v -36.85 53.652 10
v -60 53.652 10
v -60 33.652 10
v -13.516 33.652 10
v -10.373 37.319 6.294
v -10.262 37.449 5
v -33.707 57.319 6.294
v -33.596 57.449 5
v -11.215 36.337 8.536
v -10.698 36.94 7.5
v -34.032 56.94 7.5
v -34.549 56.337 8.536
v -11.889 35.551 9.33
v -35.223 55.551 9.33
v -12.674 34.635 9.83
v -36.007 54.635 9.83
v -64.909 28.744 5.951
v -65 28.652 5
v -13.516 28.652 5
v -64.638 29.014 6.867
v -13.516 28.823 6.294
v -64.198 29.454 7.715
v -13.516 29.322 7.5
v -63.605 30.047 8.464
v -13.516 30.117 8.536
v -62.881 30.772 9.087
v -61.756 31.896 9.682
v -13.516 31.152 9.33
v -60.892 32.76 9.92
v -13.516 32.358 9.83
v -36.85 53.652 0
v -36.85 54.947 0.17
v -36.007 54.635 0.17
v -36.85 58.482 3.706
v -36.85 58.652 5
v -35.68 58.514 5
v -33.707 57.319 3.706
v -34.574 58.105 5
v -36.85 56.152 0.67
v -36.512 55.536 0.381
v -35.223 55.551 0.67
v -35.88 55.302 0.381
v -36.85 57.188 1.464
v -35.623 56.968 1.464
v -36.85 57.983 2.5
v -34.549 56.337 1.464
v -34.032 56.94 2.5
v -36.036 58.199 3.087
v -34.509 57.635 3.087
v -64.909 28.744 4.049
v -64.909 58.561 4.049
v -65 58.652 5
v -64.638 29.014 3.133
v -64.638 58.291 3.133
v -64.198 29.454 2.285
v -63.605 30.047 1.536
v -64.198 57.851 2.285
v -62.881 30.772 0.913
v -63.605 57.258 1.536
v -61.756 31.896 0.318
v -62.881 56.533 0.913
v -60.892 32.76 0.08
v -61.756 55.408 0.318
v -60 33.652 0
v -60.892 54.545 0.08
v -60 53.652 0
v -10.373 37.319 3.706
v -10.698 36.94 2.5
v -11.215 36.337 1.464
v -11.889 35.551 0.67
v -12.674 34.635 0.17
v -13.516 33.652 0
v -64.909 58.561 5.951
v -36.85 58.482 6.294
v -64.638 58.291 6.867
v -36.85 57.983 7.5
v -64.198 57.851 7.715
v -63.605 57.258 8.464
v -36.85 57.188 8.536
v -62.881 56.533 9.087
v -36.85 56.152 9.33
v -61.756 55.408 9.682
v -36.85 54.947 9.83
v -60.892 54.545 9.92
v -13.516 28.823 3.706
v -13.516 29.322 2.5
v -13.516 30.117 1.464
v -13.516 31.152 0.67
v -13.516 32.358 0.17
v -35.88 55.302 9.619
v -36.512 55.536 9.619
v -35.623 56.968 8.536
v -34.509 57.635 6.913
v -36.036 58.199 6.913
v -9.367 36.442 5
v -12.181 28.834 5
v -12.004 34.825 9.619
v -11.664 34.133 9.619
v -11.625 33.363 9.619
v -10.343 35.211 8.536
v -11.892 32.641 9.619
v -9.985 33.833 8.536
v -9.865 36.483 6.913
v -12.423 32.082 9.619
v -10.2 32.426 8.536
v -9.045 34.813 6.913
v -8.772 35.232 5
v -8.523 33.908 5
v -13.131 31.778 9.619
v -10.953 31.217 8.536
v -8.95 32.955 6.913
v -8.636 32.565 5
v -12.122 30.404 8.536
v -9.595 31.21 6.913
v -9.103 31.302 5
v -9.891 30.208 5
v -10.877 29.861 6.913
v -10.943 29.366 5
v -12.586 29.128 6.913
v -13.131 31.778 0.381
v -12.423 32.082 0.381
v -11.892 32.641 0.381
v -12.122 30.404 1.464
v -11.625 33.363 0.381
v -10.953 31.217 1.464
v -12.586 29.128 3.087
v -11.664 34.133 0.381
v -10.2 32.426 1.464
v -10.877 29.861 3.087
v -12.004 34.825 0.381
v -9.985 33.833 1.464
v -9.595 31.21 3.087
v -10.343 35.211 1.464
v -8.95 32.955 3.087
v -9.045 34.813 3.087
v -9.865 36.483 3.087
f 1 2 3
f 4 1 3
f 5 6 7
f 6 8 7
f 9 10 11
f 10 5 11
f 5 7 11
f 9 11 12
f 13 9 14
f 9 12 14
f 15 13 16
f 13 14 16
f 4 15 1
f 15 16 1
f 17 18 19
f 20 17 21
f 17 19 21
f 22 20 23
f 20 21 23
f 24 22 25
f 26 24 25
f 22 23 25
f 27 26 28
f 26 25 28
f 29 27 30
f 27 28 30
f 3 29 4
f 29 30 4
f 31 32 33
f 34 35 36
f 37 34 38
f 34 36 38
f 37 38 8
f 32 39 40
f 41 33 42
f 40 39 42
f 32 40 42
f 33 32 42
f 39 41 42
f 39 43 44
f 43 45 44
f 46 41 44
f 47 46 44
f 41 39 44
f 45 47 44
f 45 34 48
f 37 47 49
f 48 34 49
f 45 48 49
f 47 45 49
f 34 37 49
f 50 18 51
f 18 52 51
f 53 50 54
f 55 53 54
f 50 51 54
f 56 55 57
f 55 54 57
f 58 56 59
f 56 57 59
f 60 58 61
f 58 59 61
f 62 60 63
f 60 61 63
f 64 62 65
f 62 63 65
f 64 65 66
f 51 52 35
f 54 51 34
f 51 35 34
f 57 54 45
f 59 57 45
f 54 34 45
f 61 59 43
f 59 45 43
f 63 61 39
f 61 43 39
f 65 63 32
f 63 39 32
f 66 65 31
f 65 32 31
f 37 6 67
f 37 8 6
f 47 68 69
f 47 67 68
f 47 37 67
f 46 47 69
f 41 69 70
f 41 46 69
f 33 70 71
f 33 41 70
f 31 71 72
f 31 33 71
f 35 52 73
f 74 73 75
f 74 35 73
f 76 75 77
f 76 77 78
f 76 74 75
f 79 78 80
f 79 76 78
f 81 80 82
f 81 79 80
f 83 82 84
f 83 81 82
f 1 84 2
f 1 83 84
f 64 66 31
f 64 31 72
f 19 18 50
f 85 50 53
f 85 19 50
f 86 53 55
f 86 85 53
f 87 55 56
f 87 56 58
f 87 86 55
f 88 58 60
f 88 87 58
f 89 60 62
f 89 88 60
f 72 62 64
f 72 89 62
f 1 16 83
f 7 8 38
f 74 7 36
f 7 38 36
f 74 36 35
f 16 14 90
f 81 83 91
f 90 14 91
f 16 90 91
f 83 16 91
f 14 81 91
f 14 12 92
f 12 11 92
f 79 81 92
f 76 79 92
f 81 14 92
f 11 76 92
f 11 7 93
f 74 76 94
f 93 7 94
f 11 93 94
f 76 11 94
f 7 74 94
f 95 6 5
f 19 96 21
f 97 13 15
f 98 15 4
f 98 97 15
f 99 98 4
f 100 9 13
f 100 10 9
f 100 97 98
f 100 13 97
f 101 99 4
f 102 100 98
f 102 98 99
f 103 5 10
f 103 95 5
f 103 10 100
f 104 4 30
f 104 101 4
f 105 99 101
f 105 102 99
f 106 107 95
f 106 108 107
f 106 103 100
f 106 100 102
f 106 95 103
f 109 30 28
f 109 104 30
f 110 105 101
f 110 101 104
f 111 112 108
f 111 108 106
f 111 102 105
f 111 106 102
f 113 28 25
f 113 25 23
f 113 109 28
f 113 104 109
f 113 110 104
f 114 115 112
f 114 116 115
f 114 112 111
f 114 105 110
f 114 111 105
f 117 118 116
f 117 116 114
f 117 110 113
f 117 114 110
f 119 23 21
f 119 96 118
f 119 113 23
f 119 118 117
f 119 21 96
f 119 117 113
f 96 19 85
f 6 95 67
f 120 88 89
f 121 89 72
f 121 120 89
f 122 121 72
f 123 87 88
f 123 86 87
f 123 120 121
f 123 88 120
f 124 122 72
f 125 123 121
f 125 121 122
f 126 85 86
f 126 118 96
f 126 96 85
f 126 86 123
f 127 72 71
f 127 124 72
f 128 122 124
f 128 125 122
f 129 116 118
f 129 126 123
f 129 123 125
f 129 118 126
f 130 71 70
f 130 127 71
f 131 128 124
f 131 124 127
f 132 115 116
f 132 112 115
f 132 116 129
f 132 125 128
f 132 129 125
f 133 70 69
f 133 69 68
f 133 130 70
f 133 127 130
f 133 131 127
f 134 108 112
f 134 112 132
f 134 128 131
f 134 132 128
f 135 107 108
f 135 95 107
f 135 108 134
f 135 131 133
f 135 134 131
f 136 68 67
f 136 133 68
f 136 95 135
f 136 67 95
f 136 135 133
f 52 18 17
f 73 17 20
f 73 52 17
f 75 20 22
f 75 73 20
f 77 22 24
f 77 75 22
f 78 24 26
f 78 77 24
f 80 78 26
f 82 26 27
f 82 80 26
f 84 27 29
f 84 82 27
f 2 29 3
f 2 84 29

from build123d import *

# Parameters (mm, degrees)
F0_W     = 30
F0_H     = 30
F1_DEPTH = 10
F2_R     = 4.99999


# Not quite as in the source:
# - a fillet or chamfer is up to 0.001 mm smaller than in the source, because OpenCascade refuses the exact size


with BuildPart() as f1:
    # F0 (on Top) → F1 (new body)
    with BuildSketch(Plane.XY):
        Polygon((0, 28.652399919), (-35, 58.652399919), (-35, 28.652399919), align=None)
        with Locations((-50, 43.652399919)):
            Rectangle(F0_W, F0_H)
    extrude(amount=F1_DEPTH)

    # F2 (radius 5 in the source; OpenCascade refuses exactly that, so slightly less here)
    f2_edges = [f1.edges().sort_by_distance(p)[0] for p in [
        (-17.5, 43.6524, 10),
        (-50, 58.6524, 10),
        (-65, 43.6524, 10),
        (-32.5, 28.6524, 10),
        (-32.5, 28.6524, 0),
        (-65, 43.6524, 0),
        (-50, 58.6524, 0),
        (-17.5, 43.6524, 0),
        (-35, 58.6524, 5),
        (0, 28.6524, 5),
    ]]
    fillet(f2_edges, radius=F2_R)


solid = f1.part
